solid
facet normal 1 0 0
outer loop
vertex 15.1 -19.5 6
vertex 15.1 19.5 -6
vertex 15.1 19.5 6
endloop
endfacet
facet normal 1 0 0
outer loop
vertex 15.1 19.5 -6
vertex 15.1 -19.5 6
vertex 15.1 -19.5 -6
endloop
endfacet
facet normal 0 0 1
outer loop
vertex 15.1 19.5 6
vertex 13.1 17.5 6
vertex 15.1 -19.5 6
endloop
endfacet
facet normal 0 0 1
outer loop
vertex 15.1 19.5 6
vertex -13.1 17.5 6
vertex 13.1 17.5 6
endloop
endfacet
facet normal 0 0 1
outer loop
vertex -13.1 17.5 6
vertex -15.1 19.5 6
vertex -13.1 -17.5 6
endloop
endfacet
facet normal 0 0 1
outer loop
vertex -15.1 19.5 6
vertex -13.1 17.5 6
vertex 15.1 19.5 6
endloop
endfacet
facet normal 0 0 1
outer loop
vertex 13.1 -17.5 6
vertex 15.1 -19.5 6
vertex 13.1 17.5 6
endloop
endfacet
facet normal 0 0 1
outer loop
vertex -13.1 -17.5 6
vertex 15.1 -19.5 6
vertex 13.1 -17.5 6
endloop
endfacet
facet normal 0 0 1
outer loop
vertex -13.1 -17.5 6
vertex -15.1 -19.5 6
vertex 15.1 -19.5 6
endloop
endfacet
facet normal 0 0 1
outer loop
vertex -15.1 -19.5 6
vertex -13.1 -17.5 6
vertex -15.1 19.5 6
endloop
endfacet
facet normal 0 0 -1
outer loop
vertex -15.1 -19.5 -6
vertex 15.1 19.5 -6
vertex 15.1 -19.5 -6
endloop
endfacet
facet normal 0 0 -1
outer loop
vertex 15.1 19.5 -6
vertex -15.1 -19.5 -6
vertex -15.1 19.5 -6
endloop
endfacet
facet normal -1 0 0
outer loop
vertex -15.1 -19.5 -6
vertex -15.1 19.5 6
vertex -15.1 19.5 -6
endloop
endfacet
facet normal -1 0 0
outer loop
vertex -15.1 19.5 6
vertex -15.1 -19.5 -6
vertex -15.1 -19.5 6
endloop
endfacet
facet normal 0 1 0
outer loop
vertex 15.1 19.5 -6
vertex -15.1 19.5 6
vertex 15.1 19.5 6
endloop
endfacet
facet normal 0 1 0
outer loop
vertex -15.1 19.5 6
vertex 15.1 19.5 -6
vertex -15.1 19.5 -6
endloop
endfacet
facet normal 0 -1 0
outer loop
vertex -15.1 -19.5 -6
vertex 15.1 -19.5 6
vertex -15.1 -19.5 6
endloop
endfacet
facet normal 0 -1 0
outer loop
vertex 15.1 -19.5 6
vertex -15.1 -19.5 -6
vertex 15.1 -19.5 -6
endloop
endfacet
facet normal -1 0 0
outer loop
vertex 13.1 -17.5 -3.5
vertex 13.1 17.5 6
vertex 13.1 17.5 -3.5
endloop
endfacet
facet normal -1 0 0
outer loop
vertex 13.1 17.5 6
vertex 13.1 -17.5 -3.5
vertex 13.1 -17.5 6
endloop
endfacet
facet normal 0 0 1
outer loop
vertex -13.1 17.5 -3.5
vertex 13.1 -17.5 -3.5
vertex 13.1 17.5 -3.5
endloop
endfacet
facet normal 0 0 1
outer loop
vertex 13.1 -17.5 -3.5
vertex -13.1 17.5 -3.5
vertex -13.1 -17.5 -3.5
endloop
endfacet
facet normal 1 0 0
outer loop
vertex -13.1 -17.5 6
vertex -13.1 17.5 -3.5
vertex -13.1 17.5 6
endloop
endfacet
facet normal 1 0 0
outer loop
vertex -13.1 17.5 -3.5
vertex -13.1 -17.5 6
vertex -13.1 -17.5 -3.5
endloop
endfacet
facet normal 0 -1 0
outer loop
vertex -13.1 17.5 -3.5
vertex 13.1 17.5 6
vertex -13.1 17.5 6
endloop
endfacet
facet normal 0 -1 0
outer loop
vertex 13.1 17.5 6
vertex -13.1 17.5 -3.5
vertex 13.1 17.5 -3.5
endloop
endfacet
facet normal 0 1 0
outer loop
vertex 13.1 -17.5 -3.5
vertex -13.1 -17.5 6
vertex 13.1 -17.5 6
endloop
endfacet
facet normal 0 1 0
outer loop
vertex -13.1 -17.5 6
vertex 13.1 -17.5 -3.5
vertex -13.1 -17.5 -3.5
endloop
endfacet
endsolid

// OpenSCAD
wall_thickness=2;
wemos_x=26.2;
wemos_y=35;
wemos_z=10;


difference(){
   wt2=wall_thickness*2;
   cube([wemos_x+wt2,wemos_y+wt2,wemos_z+wall_thickness], center=true);
   translate([0,0,wall_thickness]) cube([wemos_x,wemos_y,wemos_z+1], center=true);
}
